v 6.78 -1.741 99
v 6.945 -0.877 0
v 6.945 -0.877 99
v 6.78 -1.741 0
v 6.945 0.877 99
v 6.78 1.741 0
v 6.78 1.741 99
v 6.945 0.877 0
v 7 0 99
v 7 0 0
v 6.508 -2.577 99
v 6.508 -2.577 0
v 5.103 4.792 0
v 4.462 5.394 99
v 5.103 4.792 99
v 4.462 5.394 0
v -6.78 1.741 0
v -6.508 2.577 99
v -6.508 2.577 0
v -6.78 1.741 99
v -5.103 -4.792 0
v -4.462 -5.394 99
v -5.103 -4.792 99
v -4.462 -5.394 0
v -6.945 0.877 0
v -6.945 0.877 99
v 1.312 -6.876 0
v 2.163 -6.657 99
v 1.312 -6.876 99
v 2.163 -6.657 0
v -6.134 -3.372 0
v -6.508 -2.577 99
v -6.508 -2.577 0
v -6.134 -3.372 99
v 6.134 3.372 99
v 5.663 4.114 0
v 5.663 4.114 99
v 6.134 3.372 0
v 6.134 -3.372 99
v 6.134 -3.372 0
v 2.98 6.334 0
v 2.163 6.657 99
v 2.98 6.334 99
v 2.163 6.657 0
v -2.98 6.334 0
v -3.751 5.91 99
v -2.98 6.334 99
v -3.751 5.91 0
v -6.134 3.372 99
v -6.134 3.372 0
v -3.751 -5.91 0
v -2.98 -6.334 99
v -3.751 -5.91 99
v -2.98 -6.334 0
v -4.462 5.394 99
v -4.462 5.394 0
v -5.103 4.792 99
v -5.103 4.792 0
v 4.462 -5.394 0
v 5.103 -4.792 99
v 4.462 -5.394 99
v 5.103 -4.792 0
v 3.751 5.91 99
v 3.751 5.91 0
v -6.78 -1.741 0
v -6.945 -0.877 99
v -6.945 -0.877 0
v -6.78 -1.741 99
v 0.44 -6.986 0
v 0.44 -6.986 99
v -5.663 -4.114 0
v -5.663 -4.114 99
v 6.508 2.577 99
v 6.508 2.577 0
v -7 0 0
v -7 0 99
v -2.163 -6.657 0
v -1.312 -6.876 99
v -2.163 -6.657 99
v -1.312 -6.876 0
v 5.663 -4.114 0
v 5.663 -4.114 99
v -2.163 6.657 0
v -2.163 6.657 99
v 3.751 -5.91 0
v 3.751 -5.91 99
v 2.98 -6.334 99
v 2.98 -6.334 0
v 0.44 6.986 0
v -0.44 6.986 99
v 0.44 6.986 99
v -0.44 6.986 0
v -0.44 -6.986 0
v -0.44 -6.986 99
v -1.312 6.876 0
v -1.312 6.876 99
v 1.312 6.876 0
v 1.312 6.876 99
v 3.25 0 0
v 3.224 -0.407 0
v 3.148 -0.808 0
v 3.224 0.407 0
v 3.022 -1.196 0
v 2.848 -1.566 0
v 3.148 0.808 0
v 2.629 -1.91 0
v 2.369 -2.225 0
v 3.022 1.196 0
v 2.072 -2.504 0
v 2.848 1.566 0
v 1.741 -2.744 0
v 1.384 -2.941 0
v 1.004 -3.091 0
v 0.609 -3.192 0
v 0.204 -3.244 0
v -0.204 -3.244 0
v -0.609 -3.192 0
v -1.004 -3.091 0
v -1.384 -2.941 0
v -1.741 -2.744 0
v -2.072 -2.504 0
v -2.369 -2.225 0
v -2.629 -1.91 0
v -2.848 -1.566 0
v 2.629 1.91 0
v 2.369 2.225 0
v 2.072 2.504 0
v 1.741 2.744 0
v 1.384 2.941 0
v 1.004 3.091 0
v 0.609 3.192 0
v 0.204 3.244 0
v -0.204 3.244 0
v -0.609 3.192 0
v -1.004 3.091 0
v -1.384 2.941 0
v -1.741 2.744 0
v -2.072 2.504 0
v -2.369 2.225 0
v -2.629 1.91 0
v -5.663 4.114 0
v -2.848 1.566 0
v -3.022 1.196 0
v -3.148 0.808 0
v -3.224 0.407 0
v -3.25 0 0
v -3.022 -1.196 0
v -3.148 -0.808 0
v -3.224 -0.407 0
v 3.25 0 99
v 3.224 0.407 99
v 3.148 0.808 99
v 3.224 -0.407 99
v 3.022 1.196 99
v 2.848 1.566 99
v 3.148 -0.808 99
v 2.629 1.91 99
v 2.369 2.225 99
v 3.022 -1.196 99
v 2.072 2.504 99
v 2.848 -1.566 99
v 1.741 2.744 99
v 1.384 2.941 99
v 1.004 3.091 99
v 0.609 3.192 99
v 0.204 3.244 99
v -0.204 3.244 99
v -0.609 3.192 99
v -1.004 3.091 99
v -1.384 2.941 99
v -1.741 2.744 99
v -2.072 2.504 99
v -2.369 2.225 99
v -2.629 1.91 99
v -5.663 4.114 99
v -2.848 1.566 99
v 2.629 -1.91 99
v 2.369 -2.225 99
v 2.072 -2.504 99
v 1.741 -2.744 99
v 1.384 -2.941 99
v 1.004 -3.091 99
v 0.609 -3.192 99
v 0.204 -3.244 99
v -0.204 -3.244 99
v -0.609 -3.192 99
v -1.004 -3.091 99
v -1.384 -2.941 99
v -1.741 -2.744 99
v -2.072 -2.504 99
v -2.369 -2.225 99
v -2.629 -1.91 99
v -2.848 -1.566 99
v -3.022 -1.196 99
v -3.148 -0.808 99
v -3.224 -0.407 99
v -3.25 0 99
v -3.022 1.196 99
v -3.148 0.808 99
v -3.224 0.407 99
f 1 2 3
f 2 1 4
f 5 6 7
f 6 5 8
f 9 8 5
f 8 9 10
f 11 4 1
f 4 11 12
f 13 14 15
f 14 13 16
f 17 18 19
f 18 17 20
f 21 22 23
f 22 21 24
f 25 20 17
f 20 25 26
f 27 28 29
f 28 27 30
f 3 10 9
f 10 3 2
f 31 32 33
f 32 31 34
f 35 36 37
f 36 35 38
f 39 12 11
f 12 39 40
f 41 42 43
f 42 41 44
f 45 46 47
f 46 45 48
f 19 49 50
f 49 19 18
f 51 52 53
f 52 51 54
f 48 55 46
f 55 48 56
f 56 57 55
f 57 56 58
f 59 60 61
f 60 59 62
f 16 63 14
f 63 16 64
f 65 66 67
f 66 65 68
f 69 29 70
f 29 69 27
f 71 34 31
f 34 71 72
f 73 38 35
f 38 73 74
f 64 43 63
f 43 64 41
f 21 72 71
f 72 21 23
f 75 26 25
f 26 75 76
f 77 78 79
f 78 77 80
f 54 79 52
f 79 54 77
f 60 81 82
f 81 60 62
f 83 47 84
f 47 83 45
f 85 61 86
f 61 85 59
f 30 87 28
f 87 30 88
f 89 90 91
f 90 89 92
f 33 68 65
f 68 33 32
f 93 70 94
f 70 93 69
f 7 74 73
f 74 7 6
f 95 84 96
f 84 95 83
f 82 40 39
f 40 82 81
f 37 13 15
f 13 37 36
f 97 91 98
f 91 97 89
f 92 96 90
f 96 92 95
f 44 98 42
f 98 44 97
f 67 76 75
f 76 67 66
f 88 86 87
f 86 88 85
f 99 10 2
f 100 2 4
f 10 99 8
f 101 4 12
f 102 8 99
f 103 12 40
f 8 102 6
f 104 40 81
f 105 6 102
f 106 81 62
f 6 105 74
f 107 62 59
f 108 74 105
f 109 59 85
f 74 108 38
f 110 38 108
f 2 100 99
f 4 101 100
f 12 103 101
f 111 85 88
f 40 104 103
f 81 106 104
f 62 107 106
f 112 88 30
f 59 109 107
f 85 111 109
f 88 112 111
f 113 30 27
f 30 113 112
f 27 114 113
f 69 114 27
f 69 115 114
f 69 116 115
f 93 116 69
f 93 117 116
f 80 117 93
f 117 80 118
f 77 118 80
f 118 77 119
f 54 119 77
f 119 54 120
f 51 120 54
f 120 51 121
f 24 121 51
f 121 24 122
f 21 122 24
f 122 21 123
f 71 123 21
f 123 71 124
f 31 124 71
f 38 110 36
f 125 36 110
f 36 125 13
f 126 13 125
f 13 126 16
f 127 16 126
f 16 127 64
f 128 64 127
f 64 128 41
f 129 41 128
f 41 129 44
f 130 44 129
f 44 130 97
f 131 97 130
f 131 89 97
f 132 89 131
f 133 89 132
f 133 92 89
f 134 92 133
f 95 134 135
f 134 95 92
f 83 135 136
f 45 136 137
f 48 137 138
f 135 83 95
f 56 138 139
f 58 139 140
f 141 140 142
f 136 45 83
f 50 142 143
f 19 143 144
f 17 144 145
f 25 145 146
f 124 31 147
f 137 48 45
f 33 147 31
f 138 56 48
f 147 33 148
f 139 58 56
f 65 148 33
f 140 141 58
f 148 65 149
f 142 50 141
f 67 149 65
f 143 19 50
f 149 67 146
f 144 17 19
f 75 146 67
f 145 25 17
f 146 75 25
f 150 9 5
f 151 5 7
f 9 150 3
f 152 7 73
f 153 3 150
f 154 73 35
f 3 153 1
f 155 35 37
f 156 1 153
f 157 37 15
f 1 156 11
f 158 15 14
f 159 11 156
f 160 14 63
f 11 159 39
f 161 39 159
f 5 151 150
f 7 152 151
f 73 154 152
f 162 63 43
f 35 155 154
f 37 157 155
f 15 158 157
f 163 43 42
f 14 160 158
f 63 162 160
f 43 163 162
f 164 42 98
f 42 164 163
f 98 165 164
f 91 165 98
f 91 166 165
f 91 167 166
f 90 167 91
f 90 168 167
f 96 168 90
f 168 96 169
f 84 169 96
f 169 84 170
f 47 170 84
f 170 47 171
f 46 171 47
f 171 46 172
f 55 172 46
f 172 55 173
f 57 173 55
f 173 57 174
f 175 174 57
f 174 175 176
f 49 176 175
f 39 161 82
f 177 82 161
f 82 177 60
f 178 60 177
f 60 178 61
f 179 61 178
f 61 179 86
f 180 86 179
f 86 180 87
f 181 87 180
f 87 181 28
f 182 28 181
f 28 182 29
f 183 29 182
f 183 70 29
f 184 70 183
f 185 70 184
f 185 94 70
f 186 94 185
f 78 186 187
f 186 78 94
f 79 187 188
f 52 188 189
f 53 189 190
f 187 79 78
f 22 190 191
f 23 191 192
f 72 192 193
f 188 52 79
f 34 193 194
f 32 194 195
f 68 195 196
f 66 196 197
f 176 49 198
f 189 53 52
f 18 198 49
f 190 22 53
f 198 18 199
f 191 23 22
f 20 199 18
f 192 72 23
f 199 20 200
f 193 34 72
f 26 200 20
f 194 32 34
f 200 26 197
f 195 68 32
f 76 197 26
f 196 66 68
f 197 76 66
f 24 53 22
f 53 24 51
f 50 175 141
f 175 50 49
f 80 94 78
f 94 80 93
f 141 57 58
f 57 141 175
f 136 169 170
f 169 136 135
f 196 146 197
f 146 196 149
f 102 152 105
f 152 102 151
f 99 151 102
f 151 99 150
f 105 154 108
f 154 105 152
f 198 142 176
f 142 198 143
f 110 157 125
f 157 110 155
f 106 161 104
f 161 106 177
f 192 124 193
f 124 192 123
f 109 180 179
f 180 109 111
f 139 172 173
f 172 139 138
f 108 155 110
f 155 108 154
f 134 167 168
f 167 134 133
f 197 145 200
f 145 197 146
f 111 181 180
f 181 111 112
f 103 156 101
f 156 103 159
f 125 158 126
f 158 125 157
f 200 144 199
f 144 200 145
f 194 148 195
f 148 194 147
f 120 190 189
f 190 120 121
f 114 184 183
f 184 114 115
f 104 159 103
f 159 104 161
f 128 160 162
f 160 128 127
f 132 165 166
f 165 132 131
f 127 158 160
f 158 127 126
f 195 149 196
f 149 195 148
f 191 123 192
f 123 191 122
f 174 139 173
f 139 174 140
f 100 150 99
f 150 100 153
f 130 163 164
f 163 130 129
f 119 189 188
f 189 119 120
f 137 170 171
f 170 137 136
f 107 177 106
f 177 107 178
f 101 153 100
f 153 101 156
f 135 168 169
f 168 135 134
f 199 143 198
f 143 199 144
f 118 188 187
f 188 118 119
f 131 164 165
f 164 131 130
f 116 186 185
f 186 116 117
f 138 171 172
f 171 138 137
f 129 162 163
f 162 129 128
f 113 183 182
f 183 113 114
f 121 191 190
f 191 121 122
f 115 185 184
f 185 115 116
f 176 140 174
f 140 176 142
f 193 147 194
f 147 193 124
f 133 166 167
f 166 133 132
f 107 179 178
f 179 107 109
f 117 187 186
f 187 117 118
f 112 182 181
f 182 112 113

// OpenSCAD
$fn = 50;


difference() {
	union() {
		cylinder(h = 99, r = 7.0000000000);
	}
	union() {
		translate(v = [0.0000000000, 0.0000000000, -100.0000000000]) {
			cylinder(h = 200, r = 3.2500000000);
		}
	}
}
